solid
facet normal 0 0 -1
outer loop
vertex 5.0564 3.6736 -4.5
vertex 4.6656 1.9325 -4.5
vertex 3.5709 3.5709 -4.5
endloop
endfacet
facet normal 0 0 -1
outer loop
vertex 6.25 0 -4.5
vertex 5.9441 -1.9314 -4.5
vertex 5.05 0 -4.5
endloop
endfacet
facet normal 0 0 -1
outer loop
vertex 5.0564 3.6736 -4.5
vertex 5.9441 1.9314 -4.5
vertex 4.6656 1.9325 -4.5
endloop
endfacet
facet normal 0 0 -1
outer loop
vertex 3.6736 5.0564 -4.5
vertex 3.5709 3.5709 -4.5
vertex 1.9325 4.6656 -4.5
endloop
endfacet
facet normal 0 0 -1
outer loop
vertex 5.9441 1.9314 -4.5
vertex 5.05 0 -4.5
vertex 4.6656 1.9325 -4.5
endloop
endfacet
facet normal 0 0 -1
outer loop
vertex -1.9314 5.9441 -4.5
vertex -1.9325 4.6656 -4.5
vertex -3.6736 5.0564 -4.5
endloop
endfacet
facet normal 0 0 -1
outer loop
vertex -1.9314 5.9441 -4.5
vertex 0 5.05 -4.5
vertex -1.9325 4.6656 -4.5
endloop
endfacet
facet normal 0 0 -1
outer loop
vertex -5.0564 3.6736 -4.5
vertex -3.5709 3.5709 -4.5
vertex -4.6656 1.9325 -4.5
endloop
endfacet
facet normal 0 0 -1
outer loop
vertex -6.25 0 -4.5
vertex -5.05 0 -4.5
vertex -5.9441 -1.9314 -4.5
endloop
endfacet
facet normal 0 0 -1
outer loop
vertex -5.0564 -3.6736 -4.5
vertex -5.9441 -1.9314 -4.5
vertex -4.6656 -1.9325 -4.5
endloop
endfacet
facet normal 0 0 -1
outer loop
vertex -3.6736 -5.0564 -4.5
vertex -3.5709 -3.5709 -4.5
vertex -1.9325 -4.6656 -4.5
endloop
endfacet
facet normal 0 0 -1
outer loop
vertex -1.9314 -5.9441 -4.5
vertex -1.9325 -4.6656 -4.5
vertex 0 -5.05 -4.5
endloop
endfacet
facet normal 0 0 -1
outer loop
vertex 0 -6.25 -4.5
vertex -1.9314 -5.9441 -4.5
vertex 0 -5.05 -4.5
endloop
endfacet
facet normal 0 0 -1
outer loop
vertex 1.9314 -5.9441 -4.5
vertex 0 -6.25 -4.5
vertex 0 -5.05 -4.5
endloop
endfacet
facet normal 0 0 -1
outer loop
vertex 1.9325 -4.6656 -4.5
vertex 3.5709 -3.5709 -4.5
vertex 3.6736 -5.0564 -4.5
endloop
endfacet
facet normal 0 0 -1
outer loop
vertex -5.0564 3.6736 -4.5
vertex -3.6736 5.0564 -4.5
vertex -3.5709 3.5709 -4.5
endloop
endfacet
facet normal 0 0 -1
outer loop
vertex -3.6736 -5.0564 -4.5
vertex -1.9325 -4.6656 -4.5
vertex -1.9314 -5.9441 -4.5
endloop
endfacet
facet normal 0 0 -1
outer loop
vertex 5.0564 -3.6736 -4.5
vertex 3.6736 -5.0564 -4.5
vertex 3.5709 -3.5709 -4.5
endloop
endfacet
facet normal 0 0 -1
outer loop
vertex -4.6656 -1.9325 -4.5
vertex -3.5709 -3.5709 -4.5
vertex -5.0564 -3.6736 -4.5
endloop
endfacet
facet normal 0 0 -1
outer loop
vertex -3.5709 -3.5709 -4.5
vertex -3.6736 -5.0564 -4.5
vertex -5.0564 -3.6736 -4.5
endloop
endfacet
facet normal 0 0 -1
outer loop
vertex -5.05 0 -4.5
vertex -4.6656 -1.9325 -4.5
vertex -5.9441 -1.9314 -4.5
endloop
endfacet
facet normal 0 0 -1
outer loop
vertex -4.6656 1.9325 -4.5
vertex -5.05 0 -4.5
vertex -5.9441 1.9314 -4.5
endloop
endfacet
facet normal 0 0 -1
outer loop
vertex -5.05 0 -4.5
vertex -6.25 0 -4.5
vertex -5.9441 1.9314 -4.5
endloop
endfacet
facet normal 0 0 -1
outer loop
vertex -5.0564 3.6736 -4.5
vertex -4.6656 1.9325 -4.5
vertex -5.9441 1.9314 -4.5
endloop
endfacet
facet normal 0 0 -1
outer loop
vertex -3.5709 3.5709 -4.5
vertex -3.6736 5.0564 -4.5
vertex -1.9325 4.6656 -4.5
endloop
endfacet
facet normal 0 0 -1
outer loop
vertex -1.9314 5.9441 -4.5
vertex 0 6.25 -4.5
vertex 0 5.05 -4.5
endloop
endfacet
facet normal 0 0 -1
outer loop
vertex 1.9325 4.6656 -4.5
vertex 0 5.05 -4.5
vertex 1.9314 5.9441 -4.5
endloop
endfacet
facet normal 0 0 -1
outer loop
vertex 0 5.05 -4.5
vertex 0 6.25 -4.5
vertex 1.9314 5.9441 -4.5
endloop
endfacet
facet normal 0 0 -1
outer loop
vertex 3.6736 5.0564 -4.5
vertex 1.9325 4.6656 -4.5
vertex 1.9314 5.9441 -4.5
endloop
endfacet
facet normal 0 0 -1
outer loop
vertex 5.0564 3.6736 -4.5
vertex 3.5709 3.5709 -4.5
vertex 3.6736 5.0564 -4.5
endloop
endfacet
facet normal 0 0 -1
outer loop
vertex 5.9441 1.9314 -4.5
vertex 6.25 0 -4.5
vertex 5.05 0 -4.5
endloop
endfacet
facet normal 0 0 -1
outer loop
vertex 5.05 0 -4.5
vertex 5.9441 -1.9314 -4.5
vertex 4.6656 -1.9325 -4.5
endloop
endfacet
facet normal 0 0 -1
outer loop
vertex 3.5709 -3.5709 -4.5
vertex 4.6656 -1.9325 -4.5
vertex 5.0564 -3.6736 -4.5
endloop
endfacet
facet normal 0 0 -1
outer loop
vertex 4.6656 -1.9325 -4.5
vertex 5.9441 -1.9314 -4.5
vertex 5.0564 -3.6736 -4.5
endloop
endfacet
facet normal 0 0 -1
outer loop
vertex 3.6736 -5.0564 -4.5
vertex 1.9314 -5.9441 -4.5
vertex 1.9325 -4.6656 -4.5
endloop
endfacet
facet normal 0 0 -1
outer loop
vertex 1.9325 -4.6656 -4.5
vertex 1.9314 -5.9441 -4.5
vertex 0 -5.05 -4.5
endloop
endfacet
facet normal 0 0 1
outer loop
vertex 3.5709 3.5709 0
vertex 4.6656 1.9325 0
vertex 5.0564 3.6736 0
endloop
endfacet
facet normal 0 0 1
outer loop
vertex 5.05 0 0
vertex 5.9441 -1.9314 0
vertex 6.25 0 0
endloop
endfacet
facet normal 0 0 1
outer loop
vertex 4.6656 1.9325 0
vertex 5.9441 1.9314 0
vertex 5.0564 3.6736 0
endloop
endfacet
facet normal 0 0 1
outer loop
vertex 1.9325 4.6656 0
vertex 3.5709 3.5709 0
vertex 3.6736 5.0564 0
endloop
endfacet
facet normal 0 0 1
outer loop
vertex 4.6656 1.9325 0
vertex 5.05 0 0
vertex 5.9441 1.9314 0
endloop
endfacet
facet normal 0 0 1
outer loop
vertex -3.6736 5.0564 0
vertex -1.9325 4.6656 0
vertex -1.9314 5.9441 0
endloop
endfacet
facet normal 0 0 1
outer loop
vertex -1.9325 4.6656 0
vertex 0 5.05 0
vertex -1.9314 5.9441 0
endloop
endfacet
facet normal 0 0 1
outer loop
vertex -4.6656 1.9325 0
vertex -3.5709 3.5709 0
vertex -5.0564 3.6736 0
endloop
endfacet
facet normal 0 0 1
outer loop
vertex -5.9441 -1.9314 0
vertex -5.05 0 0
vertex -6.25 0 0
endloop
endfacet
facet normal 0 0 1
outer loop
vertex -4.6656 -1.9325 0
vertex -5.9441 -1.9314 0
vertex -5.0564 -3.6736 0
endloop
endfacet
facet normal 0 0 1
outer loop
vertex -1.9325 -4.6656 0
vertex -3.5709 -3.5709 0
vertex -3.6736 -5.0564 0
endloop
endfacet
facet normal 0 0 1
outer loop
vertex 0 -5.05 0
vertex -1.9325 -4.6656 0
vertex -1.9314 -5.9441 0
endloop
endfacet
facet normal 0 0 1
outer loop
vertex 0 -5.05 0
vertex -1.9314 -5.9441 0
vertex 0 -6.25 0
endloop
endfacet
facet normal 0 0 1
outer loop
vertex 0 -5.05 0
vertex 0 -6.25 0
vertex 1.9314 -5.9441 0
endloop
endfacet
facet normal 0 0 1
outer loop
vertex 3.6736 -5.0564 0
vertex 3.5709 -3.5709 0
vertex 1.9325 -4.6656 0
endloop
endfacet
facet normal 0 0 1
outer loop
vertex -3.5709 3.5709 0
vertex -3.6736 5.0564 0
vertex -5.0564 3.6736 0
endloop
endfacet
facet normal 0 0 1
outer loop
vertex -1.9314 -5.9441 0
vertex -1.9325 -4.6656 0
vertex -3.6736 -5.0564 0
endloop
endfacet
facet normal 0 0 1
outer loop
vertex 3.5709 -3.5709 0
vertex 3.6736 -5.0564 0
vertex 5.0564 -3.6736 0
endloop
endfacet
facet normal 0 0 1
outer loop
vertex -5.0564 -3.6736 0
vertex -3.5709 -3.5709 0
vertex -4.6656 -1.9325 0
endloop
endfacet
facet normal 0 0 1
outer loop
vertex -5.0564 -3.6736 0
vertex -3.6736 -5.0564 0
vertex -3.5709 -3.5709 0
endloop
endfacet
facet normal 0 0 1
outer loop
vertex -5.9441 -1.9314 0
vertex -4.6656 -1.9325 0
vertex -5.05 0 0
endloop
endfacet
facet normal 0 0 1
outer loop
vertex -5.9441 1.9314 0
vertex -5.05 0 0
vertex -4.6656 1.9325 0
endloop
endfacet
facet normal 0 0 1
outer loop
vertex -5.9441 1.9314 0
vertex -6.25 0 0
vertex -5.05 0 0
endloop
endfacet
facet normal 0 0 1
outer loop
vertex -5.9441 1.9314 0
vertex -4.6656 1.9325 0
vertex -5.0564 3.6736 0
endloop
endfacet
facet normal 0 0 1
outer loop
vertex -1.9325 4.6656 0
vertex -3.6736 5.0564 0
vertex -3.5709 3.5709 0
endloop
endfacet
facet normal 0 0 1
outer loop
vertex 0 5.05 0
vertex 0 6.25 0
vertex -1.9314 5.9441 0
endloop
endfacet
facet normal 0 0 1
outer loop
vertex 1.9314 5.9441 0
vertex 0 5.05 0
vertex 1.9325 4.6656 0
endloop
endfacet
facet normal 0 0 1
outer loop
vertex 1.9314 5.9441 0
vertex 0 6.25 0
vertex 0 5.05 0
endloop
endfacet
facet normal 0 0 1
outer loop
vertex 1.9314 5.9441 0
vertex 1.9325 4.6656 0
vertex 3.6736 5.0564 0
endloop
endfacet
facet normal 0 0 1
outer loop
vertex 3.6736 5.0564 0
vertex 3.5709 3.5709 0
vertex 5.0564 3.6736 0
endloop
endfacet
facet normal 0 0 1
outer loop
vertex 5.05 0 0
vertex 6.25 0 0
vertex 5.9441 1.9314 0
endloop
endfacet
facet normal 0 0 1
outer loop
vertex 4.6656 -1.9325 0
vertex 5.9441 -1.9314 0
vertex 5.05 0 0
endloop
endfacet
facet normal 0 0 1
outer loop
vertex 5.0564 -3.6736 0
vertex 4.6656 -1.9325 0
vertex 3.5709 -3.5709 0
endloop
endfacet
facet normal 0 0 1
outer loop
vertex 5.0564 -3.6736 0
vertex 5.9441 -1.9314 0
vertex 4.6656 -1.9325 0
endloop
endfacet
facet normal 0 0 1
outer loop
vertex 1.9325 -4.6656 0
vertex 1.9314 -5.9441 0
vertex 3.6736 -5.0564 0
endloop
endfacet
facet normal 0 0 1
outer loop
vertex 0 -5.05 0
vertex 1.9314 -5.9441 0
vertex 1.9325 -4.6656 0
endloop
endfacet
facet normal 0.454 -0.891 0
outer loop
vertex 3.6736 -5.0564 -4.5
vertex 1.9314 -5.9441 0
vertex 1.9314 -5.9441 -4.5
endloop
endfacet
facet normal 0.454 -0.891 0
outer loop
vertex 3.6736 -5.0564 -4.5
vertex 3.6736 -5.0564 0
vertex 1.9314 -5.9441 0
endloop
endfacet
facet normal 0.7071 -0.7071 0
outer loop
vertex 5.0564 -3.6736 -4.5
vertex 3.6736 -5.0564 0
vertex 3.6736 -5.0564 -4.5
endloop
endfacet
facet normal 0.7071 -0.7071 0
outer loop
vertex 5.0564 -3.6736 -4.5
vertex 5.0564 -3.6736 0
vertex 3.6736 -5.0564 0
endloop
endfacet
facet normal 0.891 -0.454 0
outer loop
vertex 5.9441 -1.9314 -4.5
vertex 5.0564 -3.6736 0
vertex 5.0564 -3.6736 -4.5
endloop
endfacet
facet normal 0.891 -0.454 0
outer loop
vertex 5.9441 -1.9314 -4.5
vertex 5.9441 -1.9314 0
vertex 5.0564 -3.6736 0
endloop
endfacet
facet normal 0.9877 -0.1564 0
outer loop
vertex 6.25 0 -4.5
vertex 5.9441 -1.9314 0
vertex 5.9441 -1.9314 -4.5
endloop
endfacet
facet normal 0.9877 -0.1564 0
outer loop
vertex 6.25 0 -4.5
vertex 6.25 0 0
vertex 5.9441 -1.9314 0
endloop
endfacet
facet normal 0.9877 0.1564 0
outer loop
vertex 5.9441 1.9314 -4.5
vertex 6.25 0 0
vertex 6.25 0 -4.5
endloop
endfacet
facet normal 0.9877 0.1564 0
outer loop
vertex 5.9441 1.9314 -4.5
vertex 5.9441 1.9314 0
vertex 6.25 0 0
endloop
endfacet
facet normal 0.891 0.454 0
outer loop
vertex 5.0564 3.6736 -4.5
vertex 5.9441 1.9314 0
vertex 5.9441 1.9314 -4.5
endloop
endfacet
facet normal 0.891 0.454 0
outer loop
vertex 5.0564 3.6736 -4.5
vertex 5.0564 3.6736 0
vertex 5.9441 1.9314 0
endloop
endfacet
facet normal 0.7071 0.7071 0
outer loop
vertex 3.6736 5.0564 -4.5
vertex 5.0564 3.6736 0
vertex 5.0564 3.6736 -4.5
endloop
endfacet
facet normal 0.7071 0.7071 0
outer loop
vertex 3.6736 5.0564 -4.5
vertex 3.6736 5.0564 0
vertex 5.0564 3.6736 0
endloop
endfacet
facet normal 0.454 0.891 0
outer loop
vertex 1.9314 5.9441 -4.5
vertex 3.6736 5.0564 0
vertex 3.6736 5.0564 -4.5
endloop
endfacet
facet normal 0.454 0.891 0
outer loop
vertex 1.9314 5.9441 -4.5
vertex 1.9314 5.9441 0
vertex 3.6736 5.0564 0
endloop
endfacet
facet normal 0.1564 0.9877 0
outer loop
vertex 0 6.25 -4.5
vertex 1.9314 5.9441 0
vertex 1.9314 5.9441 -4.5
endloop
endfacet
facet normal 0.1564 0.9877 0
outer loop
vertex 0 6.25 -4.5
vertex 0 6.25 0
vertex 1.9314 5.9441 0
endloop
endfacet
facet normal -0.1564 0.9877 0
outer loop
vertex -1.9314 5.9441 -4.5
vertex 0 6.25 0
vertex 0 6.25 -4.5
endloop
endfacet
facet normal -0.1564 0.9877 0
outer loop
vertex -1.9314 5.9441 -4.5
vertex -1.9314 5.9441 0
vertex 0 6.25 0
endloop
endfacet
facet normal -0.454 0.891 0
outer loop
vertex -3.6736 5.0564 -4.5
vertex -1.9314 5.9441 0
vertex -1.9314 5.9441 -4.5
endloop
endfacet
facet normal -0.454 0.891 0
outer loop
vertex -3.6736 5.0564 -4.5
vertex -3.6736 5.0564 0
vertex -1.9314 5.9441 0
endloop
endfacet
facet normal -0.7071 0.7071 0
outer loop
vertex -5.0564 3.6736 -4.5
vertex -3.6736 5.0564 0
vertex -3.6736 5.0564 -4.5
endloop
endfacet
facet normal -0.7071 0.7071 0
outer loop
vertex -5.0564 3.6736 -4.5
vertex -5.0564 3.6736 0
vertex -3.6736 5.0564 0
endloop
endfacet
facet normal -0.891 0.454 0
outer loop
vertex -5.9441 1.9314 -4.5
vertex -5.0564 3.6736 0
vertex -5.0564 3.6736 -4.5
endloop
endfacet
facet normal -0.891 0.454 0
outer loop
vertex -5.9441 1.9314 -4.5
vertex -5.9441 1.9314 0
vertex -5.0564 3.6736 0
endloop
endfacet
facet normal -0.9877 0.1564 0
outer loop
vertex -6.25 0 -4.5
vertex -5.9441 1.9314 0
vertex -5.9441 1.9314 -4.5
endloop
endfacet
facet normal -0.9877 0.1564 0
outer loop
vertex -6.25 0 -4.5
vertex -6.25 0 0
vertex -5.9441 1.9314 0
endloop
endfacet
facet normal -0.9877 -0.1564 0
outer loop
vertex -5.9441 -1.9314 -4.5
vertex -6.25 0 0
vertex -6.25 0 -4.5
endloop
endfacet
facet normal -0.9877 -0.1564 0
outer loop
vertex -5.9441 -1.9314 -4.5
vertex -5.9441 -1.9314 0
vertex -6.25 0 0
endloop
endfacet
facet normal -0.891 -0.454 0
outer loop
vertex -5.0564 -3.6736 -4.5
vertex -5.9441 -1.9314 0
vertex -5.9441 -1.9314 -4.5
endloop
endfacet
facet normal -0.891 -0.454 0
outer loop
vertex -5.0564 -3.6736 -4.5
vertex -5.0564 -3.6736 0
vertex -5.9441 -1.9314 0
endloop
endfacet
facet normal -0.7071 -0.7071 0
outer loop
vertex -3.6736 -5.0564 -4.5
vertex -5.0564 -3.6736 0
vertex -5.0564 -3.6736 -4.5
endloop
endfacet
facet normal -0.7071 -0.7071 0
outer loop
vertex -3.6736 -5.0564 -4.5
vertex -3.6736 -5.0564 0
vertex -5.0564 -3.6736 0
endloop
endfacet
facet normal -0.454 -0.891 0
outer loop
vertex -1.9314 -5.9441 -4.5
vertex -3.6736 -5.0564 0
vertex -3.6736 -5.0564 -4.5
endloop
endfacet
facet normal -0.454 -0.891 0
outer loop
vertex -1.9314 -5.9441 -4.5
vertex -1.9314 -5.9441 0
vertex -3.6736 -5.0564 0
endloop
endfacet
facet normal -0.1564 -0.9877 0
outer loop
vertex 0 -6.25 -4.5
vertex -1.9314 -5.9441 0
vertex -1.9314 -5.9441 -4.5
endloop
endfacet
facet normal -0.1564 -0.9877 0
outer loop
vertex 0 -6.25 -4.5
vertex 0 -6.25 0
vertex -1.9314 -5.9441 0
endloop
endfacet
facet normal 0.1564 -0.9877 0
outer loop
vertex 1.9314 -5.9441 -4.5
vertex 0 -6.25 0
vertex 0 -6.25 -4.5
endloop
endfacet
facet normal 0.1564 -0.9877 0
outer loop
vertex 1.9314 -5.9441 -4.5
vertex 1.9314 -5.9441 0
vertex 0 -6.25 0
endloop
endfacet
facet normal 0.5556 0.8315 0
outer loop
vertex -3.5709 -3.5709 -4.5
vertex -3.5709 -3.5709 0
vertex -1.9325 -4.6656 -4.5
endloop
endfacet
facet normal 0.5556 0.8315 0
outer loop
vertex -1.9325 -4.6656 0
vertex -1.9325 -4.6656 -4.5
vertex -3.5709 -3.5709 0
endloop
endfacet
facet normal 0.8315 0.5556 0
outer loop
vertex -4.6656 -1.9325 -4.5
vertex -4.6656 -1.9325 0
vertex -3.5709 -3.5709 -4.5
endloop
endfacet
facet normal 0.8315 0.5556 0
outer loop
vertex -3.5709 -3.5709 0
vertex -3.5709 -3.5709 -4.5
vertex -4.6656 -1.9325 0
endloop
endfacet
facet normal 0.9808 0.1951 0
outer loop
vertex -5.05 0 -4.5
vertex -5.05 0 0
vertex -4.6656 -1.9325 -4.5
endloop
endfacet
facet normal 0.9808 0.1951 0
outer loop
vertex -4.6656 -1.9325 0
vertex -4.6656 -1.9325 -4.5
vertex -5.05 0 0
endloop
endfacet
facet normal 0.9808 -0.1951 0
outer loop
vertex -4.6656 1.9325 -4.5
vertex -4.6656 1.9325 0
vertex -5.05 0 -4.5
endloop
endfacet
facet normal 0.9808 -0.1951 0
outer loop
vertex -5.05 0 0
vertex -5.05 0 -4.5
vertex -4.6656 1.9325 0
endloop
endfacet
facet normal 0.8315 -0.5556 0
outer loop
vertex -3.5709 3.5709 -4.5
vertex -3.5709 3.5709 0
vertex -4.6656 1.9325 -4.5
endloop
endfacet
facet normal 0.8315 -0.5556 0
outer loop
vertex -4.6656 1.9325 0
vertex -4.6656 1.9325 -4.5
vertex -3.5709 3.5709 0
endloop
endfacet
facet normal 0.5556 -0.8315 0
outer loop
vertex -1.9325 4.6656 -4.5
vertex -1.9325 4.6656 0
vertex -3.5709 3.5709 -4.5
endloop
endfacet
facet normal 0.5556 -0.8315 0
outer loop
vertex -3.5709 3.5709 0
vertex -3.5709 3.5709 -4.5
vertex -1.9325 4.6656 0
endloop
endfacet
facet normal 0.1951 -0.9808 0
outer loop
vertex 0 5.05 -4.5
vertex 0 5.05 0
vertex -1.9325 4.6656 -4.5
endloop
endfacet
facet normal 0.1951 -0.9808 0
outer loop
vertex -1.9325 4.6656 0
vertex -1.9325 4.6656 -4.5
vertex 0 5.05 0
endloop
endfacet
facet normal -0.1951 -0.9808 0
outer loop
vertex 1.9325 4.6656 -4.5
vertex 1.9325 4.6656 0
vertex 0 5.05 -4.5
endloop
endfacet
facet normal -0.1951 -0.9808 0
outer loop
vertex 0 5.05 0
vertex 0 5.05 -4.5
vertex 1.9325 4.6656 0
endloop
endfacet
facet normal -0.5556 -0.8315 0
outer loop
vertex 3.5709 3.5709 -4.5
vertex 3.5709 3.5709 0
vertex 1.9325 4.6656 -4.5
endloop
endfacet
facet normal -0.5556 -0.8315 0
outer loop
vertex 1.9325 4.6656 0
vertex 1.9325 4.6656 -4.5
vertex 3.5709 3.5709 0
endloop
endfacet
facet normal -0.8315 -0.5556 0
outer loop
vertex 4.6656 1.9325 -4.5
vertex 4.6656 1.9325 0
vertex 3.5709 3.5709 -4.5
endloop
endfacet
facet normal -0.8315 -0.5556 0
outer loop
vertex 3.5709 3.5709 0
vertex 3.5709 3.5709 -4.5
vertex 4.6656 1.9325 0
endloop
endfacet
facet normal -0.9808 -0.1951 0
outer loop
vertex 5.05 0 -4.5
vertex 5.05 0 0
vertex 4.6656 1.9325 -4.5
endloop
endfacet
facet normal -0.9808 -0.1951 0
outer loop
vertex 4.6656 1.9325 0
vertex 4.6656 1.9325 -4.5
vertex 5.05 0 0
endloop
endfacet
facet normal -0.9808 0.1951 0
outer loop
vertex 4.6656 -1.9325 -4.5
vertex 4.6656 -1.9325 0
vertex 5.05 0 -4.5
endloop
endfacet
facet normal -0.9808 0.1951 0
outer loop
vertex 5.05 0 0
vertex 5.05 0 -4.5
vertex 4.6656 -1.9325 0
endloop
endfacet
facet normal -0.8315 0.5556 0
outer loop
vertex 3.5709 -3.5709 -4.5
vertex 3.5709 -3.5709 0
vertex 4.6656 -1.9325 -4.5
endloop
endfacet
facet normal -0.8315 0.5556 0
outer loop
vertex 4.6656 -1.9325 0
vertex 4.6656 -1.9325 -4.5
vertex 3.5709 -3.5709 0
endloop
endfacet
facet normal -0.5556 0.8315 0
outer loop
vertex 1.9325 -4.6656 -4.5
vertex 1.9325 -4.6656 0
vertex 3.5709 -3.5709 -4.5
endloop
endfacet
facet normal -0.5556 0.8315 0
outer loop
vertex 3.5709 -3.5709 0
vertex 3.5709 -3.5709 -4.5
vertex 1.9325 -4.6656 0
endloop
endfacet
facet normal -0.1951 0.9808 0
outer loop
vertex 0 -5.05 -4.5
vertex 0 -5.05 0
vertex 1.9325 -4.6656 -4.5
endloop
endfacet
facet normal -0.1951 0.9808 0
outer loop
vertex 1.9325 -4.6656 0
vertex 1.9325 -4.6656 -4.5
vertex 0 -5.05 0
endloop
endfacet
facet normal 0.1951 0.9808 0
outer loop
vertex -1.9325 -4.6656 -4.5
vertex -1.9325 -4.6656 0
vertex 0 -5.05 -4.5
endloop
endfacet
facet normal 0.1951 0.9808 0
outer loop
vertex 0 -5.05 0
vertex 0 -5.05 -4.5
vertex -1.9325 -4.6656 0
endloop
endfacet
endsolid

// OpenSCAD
*import("nerf-mega-tip.stl");

minWallThck=1.2;
innerDia=12.5;
outerDia=18.4;
innerHght=4.5;
outerHght=17;
rad=1;

translate([0,0,-innerHght])
  linear_extrude(innerHght) difference(){
    circle(d=innerDia);
    circle(d=innerDia-minWallThck*2);
  }
